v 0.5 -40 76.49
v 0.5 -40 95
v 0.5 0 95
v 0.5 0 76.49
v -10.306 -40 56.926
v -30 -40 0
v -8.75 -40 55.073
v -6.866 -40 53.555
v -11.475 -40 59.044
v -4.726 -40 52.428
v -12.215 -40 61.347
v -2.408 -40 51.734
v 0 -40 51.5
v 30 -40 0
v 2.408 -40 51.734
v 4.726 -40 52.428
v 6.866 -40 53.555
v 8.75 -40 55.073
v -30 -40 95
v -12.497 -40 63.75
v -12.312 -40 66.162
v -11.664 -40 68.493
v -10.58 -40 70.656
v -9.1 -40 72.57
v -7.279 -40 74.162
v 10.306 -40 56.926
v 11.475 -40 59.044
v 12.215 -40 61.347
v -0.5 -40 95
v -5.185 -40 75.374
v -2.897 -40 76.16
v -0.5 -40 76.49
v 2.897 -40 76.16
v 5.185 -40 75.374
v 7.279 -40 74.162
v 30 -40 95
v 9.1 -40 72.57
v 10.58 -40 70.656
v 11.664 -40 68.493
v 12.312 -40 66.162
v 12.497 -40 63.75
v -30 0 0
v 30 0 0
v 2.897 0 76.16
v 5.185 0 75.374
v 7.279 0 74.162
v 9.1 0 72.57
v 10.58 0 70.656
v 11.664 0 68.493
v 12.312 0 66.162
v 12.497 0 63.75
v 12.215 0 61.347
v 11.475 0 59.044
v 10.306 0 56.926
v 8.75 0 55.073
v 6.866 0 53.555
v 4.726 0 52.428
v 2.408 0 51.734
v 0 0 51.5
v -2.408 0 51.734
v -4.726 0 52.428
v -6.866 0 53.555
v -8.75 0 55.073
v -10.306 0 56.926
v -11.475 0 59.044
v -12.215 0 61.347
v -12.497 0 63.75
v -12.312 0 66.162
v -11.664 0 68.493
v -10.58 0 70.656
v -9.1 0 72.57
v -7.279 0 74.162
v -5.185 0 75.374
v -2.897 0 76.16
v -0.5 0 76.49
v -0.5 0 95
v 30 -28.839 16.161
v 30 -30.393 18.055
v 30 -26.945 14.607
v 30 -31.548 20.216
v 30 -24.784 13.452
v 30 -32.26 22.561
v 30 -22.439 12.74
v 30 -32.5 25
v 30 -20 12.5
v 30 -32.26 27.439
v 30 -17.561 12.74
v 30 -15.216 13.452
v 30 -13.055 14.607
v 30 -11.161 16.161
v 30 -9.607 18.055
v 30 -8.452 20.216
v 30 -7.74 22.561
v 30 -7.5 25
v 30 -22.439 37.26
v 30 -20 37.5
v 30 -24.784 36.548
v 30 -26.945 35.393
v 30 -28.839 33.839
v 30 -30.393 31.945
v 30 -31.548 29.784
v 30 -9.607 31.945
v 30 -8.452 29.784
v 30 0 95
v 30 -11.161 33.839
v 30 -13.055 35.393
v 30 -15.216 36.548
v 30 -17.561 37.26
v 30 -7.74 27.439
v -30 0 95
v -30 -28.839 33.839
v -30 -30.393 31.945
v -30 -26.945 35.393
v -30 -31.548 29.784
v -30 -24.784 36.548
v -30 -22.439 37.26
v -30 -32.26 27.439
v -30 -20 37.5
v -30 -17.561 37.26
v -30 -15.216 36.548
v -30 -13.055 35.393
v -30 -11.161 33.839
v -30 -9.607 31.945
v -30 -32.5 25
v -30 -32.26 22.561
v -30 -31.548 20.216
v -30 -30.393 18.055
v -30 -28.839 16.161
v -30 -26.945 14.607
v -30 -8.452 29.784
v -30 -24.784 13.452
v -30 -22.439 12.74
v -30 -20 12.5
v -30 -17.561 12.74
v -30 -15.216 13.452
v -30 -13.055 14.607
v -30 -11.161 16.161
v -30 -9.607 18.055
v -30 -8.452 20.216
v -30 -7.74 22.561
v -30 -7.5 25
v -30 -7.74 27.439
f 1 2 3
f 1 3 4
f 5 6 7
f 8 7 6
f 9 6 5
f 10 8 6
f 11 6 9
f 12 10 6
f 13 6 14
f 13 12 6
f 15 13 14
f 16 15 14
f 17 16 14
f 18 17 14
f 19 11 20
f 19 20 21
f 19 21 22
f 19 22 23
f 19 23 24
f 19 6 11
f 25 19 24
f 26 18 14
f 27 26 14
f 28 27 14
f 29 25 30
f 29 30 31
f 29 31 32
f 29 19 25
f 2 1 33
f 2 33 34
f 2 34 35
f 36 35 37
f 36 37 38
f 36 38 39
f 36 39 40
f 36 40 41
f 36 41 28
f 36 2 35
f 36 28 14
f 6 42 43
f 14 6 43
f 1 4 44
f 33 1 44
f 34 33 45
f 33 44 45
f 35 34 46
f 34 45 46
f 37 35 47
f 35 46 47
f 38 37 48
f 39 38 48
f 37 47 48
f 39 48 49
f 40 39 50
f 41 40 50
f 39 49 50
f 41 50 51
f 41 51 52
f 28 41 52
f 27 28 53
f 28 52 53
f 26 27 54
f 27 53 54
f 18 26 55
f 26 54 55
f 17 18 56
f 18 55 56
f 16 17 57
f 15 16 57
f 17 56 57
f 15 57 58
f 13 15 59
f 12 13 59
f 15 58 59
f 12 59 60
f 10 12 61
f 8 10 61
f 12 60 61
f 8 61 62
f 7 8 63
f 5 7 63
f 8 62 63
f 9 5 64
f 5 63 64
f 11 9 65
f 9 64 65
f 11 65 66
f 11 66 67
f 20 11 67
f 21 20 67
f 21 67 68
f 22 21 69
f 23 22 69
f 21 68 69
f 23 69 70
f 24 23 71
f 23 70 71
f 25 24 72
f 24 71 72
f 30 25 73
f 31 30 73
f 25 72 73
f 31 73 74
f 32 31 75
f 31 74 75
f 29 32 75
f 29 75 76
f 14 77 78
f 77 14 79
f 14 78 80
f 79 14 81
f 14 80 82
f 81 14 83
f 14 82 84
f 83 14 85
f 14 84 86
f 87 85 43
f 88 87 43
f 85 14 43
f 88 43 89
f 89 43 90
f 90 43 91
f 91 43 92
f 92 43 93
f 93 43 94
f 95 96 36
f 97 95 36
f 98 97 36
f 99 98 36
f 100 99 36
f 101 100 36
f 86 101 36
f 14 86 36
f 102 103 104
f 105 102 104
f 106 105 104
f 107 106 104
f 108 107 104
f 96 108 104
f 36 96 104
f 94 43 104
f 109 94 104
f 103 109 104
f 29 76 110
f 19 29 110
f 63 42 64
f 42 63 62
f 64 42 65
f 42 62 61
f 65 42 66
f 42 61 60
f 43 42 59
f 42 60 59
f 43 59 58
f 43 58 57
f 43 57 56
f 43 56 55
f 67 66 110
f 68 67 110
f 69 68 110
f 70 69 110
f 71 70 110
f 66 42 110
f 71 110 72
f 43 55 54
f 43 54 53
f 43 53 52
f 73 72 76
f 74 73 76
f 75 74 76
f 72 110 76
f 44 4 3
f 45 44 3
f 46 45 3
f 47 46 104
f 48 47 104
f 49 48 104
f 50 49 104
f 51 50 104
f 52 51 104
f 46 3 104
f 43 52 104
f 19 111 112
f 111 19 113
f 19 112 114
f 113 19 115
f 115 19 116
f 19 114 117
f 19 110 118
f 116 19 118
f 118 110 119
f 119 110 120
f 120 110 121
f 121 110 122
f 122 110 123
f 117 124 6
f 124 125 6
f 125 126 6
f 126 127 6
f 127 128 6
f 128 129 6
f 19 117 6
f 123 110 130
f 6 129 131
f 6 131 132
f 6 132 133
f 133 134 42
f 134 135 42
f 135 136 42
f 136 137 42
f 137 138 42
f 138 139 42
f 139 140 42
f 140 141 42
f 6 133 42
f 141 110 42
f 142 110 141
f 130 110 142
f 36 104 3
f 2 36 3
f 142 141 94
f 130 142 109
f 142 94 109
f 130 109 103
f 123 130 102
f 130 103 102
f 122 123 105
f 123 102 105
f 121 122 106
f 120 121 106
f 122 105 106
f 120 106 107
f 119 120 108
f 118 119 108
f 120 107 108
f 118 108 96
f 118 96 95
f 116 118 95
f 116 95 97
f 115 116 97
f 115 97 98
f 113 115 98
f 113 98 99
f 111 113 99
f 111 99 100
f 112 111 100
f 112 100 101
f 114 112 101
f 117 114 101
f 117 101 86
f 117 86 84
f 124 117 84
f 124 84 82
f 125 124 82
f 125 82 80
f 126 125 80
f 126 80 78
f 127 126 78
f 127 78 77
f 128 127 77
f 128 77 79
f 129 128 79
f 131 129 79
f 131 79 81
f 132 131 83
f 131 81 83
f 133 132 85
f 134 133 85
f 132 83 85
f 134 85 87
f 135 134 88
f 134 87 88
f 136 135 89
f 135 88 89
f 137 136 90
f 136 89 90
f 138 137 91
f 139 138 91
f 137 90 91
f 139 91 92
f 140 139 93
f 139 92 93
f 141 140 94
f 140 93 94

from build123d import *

# Parameters (mm, degrees)
F1_DEPTH = 40
F2_R     = 12.5
F3_DEPTH = 60.001


with BuildPart() as f1:
    # F0 (on Front) → F1 (new body)
    with BuildSketch(Plane.XZ):
        with BuildLine():
            Line((-30, 95), (-30, 0))
            Line((-30, 0), (30, 0))
            Line((30, 0), (30, 95))
            Line((30, 95), (0.5, 95))
            Line((0.5, 95), (0.5, 76.489996))
            ThreePointArc((0.5, 76.489996), (0, 51.5), (-0.5, 76.489996))
            Line((-0.5, 76.489996), (-0.5, 95))
            Line((-0.5, 95), (-30, 95))
        make_face()
    extrude(amount=F1_DEPTH)

    # F2 (on face) → F3 (cut, through all)
    with BuildSketch(Plane.YZ.offset(30)):
        with Locations((-20, 25)):
            Circle(F2_R)
    extrude(amount=-F3_DEPTH, mode=Mode.SUBTRACT)


solid = f1.part
